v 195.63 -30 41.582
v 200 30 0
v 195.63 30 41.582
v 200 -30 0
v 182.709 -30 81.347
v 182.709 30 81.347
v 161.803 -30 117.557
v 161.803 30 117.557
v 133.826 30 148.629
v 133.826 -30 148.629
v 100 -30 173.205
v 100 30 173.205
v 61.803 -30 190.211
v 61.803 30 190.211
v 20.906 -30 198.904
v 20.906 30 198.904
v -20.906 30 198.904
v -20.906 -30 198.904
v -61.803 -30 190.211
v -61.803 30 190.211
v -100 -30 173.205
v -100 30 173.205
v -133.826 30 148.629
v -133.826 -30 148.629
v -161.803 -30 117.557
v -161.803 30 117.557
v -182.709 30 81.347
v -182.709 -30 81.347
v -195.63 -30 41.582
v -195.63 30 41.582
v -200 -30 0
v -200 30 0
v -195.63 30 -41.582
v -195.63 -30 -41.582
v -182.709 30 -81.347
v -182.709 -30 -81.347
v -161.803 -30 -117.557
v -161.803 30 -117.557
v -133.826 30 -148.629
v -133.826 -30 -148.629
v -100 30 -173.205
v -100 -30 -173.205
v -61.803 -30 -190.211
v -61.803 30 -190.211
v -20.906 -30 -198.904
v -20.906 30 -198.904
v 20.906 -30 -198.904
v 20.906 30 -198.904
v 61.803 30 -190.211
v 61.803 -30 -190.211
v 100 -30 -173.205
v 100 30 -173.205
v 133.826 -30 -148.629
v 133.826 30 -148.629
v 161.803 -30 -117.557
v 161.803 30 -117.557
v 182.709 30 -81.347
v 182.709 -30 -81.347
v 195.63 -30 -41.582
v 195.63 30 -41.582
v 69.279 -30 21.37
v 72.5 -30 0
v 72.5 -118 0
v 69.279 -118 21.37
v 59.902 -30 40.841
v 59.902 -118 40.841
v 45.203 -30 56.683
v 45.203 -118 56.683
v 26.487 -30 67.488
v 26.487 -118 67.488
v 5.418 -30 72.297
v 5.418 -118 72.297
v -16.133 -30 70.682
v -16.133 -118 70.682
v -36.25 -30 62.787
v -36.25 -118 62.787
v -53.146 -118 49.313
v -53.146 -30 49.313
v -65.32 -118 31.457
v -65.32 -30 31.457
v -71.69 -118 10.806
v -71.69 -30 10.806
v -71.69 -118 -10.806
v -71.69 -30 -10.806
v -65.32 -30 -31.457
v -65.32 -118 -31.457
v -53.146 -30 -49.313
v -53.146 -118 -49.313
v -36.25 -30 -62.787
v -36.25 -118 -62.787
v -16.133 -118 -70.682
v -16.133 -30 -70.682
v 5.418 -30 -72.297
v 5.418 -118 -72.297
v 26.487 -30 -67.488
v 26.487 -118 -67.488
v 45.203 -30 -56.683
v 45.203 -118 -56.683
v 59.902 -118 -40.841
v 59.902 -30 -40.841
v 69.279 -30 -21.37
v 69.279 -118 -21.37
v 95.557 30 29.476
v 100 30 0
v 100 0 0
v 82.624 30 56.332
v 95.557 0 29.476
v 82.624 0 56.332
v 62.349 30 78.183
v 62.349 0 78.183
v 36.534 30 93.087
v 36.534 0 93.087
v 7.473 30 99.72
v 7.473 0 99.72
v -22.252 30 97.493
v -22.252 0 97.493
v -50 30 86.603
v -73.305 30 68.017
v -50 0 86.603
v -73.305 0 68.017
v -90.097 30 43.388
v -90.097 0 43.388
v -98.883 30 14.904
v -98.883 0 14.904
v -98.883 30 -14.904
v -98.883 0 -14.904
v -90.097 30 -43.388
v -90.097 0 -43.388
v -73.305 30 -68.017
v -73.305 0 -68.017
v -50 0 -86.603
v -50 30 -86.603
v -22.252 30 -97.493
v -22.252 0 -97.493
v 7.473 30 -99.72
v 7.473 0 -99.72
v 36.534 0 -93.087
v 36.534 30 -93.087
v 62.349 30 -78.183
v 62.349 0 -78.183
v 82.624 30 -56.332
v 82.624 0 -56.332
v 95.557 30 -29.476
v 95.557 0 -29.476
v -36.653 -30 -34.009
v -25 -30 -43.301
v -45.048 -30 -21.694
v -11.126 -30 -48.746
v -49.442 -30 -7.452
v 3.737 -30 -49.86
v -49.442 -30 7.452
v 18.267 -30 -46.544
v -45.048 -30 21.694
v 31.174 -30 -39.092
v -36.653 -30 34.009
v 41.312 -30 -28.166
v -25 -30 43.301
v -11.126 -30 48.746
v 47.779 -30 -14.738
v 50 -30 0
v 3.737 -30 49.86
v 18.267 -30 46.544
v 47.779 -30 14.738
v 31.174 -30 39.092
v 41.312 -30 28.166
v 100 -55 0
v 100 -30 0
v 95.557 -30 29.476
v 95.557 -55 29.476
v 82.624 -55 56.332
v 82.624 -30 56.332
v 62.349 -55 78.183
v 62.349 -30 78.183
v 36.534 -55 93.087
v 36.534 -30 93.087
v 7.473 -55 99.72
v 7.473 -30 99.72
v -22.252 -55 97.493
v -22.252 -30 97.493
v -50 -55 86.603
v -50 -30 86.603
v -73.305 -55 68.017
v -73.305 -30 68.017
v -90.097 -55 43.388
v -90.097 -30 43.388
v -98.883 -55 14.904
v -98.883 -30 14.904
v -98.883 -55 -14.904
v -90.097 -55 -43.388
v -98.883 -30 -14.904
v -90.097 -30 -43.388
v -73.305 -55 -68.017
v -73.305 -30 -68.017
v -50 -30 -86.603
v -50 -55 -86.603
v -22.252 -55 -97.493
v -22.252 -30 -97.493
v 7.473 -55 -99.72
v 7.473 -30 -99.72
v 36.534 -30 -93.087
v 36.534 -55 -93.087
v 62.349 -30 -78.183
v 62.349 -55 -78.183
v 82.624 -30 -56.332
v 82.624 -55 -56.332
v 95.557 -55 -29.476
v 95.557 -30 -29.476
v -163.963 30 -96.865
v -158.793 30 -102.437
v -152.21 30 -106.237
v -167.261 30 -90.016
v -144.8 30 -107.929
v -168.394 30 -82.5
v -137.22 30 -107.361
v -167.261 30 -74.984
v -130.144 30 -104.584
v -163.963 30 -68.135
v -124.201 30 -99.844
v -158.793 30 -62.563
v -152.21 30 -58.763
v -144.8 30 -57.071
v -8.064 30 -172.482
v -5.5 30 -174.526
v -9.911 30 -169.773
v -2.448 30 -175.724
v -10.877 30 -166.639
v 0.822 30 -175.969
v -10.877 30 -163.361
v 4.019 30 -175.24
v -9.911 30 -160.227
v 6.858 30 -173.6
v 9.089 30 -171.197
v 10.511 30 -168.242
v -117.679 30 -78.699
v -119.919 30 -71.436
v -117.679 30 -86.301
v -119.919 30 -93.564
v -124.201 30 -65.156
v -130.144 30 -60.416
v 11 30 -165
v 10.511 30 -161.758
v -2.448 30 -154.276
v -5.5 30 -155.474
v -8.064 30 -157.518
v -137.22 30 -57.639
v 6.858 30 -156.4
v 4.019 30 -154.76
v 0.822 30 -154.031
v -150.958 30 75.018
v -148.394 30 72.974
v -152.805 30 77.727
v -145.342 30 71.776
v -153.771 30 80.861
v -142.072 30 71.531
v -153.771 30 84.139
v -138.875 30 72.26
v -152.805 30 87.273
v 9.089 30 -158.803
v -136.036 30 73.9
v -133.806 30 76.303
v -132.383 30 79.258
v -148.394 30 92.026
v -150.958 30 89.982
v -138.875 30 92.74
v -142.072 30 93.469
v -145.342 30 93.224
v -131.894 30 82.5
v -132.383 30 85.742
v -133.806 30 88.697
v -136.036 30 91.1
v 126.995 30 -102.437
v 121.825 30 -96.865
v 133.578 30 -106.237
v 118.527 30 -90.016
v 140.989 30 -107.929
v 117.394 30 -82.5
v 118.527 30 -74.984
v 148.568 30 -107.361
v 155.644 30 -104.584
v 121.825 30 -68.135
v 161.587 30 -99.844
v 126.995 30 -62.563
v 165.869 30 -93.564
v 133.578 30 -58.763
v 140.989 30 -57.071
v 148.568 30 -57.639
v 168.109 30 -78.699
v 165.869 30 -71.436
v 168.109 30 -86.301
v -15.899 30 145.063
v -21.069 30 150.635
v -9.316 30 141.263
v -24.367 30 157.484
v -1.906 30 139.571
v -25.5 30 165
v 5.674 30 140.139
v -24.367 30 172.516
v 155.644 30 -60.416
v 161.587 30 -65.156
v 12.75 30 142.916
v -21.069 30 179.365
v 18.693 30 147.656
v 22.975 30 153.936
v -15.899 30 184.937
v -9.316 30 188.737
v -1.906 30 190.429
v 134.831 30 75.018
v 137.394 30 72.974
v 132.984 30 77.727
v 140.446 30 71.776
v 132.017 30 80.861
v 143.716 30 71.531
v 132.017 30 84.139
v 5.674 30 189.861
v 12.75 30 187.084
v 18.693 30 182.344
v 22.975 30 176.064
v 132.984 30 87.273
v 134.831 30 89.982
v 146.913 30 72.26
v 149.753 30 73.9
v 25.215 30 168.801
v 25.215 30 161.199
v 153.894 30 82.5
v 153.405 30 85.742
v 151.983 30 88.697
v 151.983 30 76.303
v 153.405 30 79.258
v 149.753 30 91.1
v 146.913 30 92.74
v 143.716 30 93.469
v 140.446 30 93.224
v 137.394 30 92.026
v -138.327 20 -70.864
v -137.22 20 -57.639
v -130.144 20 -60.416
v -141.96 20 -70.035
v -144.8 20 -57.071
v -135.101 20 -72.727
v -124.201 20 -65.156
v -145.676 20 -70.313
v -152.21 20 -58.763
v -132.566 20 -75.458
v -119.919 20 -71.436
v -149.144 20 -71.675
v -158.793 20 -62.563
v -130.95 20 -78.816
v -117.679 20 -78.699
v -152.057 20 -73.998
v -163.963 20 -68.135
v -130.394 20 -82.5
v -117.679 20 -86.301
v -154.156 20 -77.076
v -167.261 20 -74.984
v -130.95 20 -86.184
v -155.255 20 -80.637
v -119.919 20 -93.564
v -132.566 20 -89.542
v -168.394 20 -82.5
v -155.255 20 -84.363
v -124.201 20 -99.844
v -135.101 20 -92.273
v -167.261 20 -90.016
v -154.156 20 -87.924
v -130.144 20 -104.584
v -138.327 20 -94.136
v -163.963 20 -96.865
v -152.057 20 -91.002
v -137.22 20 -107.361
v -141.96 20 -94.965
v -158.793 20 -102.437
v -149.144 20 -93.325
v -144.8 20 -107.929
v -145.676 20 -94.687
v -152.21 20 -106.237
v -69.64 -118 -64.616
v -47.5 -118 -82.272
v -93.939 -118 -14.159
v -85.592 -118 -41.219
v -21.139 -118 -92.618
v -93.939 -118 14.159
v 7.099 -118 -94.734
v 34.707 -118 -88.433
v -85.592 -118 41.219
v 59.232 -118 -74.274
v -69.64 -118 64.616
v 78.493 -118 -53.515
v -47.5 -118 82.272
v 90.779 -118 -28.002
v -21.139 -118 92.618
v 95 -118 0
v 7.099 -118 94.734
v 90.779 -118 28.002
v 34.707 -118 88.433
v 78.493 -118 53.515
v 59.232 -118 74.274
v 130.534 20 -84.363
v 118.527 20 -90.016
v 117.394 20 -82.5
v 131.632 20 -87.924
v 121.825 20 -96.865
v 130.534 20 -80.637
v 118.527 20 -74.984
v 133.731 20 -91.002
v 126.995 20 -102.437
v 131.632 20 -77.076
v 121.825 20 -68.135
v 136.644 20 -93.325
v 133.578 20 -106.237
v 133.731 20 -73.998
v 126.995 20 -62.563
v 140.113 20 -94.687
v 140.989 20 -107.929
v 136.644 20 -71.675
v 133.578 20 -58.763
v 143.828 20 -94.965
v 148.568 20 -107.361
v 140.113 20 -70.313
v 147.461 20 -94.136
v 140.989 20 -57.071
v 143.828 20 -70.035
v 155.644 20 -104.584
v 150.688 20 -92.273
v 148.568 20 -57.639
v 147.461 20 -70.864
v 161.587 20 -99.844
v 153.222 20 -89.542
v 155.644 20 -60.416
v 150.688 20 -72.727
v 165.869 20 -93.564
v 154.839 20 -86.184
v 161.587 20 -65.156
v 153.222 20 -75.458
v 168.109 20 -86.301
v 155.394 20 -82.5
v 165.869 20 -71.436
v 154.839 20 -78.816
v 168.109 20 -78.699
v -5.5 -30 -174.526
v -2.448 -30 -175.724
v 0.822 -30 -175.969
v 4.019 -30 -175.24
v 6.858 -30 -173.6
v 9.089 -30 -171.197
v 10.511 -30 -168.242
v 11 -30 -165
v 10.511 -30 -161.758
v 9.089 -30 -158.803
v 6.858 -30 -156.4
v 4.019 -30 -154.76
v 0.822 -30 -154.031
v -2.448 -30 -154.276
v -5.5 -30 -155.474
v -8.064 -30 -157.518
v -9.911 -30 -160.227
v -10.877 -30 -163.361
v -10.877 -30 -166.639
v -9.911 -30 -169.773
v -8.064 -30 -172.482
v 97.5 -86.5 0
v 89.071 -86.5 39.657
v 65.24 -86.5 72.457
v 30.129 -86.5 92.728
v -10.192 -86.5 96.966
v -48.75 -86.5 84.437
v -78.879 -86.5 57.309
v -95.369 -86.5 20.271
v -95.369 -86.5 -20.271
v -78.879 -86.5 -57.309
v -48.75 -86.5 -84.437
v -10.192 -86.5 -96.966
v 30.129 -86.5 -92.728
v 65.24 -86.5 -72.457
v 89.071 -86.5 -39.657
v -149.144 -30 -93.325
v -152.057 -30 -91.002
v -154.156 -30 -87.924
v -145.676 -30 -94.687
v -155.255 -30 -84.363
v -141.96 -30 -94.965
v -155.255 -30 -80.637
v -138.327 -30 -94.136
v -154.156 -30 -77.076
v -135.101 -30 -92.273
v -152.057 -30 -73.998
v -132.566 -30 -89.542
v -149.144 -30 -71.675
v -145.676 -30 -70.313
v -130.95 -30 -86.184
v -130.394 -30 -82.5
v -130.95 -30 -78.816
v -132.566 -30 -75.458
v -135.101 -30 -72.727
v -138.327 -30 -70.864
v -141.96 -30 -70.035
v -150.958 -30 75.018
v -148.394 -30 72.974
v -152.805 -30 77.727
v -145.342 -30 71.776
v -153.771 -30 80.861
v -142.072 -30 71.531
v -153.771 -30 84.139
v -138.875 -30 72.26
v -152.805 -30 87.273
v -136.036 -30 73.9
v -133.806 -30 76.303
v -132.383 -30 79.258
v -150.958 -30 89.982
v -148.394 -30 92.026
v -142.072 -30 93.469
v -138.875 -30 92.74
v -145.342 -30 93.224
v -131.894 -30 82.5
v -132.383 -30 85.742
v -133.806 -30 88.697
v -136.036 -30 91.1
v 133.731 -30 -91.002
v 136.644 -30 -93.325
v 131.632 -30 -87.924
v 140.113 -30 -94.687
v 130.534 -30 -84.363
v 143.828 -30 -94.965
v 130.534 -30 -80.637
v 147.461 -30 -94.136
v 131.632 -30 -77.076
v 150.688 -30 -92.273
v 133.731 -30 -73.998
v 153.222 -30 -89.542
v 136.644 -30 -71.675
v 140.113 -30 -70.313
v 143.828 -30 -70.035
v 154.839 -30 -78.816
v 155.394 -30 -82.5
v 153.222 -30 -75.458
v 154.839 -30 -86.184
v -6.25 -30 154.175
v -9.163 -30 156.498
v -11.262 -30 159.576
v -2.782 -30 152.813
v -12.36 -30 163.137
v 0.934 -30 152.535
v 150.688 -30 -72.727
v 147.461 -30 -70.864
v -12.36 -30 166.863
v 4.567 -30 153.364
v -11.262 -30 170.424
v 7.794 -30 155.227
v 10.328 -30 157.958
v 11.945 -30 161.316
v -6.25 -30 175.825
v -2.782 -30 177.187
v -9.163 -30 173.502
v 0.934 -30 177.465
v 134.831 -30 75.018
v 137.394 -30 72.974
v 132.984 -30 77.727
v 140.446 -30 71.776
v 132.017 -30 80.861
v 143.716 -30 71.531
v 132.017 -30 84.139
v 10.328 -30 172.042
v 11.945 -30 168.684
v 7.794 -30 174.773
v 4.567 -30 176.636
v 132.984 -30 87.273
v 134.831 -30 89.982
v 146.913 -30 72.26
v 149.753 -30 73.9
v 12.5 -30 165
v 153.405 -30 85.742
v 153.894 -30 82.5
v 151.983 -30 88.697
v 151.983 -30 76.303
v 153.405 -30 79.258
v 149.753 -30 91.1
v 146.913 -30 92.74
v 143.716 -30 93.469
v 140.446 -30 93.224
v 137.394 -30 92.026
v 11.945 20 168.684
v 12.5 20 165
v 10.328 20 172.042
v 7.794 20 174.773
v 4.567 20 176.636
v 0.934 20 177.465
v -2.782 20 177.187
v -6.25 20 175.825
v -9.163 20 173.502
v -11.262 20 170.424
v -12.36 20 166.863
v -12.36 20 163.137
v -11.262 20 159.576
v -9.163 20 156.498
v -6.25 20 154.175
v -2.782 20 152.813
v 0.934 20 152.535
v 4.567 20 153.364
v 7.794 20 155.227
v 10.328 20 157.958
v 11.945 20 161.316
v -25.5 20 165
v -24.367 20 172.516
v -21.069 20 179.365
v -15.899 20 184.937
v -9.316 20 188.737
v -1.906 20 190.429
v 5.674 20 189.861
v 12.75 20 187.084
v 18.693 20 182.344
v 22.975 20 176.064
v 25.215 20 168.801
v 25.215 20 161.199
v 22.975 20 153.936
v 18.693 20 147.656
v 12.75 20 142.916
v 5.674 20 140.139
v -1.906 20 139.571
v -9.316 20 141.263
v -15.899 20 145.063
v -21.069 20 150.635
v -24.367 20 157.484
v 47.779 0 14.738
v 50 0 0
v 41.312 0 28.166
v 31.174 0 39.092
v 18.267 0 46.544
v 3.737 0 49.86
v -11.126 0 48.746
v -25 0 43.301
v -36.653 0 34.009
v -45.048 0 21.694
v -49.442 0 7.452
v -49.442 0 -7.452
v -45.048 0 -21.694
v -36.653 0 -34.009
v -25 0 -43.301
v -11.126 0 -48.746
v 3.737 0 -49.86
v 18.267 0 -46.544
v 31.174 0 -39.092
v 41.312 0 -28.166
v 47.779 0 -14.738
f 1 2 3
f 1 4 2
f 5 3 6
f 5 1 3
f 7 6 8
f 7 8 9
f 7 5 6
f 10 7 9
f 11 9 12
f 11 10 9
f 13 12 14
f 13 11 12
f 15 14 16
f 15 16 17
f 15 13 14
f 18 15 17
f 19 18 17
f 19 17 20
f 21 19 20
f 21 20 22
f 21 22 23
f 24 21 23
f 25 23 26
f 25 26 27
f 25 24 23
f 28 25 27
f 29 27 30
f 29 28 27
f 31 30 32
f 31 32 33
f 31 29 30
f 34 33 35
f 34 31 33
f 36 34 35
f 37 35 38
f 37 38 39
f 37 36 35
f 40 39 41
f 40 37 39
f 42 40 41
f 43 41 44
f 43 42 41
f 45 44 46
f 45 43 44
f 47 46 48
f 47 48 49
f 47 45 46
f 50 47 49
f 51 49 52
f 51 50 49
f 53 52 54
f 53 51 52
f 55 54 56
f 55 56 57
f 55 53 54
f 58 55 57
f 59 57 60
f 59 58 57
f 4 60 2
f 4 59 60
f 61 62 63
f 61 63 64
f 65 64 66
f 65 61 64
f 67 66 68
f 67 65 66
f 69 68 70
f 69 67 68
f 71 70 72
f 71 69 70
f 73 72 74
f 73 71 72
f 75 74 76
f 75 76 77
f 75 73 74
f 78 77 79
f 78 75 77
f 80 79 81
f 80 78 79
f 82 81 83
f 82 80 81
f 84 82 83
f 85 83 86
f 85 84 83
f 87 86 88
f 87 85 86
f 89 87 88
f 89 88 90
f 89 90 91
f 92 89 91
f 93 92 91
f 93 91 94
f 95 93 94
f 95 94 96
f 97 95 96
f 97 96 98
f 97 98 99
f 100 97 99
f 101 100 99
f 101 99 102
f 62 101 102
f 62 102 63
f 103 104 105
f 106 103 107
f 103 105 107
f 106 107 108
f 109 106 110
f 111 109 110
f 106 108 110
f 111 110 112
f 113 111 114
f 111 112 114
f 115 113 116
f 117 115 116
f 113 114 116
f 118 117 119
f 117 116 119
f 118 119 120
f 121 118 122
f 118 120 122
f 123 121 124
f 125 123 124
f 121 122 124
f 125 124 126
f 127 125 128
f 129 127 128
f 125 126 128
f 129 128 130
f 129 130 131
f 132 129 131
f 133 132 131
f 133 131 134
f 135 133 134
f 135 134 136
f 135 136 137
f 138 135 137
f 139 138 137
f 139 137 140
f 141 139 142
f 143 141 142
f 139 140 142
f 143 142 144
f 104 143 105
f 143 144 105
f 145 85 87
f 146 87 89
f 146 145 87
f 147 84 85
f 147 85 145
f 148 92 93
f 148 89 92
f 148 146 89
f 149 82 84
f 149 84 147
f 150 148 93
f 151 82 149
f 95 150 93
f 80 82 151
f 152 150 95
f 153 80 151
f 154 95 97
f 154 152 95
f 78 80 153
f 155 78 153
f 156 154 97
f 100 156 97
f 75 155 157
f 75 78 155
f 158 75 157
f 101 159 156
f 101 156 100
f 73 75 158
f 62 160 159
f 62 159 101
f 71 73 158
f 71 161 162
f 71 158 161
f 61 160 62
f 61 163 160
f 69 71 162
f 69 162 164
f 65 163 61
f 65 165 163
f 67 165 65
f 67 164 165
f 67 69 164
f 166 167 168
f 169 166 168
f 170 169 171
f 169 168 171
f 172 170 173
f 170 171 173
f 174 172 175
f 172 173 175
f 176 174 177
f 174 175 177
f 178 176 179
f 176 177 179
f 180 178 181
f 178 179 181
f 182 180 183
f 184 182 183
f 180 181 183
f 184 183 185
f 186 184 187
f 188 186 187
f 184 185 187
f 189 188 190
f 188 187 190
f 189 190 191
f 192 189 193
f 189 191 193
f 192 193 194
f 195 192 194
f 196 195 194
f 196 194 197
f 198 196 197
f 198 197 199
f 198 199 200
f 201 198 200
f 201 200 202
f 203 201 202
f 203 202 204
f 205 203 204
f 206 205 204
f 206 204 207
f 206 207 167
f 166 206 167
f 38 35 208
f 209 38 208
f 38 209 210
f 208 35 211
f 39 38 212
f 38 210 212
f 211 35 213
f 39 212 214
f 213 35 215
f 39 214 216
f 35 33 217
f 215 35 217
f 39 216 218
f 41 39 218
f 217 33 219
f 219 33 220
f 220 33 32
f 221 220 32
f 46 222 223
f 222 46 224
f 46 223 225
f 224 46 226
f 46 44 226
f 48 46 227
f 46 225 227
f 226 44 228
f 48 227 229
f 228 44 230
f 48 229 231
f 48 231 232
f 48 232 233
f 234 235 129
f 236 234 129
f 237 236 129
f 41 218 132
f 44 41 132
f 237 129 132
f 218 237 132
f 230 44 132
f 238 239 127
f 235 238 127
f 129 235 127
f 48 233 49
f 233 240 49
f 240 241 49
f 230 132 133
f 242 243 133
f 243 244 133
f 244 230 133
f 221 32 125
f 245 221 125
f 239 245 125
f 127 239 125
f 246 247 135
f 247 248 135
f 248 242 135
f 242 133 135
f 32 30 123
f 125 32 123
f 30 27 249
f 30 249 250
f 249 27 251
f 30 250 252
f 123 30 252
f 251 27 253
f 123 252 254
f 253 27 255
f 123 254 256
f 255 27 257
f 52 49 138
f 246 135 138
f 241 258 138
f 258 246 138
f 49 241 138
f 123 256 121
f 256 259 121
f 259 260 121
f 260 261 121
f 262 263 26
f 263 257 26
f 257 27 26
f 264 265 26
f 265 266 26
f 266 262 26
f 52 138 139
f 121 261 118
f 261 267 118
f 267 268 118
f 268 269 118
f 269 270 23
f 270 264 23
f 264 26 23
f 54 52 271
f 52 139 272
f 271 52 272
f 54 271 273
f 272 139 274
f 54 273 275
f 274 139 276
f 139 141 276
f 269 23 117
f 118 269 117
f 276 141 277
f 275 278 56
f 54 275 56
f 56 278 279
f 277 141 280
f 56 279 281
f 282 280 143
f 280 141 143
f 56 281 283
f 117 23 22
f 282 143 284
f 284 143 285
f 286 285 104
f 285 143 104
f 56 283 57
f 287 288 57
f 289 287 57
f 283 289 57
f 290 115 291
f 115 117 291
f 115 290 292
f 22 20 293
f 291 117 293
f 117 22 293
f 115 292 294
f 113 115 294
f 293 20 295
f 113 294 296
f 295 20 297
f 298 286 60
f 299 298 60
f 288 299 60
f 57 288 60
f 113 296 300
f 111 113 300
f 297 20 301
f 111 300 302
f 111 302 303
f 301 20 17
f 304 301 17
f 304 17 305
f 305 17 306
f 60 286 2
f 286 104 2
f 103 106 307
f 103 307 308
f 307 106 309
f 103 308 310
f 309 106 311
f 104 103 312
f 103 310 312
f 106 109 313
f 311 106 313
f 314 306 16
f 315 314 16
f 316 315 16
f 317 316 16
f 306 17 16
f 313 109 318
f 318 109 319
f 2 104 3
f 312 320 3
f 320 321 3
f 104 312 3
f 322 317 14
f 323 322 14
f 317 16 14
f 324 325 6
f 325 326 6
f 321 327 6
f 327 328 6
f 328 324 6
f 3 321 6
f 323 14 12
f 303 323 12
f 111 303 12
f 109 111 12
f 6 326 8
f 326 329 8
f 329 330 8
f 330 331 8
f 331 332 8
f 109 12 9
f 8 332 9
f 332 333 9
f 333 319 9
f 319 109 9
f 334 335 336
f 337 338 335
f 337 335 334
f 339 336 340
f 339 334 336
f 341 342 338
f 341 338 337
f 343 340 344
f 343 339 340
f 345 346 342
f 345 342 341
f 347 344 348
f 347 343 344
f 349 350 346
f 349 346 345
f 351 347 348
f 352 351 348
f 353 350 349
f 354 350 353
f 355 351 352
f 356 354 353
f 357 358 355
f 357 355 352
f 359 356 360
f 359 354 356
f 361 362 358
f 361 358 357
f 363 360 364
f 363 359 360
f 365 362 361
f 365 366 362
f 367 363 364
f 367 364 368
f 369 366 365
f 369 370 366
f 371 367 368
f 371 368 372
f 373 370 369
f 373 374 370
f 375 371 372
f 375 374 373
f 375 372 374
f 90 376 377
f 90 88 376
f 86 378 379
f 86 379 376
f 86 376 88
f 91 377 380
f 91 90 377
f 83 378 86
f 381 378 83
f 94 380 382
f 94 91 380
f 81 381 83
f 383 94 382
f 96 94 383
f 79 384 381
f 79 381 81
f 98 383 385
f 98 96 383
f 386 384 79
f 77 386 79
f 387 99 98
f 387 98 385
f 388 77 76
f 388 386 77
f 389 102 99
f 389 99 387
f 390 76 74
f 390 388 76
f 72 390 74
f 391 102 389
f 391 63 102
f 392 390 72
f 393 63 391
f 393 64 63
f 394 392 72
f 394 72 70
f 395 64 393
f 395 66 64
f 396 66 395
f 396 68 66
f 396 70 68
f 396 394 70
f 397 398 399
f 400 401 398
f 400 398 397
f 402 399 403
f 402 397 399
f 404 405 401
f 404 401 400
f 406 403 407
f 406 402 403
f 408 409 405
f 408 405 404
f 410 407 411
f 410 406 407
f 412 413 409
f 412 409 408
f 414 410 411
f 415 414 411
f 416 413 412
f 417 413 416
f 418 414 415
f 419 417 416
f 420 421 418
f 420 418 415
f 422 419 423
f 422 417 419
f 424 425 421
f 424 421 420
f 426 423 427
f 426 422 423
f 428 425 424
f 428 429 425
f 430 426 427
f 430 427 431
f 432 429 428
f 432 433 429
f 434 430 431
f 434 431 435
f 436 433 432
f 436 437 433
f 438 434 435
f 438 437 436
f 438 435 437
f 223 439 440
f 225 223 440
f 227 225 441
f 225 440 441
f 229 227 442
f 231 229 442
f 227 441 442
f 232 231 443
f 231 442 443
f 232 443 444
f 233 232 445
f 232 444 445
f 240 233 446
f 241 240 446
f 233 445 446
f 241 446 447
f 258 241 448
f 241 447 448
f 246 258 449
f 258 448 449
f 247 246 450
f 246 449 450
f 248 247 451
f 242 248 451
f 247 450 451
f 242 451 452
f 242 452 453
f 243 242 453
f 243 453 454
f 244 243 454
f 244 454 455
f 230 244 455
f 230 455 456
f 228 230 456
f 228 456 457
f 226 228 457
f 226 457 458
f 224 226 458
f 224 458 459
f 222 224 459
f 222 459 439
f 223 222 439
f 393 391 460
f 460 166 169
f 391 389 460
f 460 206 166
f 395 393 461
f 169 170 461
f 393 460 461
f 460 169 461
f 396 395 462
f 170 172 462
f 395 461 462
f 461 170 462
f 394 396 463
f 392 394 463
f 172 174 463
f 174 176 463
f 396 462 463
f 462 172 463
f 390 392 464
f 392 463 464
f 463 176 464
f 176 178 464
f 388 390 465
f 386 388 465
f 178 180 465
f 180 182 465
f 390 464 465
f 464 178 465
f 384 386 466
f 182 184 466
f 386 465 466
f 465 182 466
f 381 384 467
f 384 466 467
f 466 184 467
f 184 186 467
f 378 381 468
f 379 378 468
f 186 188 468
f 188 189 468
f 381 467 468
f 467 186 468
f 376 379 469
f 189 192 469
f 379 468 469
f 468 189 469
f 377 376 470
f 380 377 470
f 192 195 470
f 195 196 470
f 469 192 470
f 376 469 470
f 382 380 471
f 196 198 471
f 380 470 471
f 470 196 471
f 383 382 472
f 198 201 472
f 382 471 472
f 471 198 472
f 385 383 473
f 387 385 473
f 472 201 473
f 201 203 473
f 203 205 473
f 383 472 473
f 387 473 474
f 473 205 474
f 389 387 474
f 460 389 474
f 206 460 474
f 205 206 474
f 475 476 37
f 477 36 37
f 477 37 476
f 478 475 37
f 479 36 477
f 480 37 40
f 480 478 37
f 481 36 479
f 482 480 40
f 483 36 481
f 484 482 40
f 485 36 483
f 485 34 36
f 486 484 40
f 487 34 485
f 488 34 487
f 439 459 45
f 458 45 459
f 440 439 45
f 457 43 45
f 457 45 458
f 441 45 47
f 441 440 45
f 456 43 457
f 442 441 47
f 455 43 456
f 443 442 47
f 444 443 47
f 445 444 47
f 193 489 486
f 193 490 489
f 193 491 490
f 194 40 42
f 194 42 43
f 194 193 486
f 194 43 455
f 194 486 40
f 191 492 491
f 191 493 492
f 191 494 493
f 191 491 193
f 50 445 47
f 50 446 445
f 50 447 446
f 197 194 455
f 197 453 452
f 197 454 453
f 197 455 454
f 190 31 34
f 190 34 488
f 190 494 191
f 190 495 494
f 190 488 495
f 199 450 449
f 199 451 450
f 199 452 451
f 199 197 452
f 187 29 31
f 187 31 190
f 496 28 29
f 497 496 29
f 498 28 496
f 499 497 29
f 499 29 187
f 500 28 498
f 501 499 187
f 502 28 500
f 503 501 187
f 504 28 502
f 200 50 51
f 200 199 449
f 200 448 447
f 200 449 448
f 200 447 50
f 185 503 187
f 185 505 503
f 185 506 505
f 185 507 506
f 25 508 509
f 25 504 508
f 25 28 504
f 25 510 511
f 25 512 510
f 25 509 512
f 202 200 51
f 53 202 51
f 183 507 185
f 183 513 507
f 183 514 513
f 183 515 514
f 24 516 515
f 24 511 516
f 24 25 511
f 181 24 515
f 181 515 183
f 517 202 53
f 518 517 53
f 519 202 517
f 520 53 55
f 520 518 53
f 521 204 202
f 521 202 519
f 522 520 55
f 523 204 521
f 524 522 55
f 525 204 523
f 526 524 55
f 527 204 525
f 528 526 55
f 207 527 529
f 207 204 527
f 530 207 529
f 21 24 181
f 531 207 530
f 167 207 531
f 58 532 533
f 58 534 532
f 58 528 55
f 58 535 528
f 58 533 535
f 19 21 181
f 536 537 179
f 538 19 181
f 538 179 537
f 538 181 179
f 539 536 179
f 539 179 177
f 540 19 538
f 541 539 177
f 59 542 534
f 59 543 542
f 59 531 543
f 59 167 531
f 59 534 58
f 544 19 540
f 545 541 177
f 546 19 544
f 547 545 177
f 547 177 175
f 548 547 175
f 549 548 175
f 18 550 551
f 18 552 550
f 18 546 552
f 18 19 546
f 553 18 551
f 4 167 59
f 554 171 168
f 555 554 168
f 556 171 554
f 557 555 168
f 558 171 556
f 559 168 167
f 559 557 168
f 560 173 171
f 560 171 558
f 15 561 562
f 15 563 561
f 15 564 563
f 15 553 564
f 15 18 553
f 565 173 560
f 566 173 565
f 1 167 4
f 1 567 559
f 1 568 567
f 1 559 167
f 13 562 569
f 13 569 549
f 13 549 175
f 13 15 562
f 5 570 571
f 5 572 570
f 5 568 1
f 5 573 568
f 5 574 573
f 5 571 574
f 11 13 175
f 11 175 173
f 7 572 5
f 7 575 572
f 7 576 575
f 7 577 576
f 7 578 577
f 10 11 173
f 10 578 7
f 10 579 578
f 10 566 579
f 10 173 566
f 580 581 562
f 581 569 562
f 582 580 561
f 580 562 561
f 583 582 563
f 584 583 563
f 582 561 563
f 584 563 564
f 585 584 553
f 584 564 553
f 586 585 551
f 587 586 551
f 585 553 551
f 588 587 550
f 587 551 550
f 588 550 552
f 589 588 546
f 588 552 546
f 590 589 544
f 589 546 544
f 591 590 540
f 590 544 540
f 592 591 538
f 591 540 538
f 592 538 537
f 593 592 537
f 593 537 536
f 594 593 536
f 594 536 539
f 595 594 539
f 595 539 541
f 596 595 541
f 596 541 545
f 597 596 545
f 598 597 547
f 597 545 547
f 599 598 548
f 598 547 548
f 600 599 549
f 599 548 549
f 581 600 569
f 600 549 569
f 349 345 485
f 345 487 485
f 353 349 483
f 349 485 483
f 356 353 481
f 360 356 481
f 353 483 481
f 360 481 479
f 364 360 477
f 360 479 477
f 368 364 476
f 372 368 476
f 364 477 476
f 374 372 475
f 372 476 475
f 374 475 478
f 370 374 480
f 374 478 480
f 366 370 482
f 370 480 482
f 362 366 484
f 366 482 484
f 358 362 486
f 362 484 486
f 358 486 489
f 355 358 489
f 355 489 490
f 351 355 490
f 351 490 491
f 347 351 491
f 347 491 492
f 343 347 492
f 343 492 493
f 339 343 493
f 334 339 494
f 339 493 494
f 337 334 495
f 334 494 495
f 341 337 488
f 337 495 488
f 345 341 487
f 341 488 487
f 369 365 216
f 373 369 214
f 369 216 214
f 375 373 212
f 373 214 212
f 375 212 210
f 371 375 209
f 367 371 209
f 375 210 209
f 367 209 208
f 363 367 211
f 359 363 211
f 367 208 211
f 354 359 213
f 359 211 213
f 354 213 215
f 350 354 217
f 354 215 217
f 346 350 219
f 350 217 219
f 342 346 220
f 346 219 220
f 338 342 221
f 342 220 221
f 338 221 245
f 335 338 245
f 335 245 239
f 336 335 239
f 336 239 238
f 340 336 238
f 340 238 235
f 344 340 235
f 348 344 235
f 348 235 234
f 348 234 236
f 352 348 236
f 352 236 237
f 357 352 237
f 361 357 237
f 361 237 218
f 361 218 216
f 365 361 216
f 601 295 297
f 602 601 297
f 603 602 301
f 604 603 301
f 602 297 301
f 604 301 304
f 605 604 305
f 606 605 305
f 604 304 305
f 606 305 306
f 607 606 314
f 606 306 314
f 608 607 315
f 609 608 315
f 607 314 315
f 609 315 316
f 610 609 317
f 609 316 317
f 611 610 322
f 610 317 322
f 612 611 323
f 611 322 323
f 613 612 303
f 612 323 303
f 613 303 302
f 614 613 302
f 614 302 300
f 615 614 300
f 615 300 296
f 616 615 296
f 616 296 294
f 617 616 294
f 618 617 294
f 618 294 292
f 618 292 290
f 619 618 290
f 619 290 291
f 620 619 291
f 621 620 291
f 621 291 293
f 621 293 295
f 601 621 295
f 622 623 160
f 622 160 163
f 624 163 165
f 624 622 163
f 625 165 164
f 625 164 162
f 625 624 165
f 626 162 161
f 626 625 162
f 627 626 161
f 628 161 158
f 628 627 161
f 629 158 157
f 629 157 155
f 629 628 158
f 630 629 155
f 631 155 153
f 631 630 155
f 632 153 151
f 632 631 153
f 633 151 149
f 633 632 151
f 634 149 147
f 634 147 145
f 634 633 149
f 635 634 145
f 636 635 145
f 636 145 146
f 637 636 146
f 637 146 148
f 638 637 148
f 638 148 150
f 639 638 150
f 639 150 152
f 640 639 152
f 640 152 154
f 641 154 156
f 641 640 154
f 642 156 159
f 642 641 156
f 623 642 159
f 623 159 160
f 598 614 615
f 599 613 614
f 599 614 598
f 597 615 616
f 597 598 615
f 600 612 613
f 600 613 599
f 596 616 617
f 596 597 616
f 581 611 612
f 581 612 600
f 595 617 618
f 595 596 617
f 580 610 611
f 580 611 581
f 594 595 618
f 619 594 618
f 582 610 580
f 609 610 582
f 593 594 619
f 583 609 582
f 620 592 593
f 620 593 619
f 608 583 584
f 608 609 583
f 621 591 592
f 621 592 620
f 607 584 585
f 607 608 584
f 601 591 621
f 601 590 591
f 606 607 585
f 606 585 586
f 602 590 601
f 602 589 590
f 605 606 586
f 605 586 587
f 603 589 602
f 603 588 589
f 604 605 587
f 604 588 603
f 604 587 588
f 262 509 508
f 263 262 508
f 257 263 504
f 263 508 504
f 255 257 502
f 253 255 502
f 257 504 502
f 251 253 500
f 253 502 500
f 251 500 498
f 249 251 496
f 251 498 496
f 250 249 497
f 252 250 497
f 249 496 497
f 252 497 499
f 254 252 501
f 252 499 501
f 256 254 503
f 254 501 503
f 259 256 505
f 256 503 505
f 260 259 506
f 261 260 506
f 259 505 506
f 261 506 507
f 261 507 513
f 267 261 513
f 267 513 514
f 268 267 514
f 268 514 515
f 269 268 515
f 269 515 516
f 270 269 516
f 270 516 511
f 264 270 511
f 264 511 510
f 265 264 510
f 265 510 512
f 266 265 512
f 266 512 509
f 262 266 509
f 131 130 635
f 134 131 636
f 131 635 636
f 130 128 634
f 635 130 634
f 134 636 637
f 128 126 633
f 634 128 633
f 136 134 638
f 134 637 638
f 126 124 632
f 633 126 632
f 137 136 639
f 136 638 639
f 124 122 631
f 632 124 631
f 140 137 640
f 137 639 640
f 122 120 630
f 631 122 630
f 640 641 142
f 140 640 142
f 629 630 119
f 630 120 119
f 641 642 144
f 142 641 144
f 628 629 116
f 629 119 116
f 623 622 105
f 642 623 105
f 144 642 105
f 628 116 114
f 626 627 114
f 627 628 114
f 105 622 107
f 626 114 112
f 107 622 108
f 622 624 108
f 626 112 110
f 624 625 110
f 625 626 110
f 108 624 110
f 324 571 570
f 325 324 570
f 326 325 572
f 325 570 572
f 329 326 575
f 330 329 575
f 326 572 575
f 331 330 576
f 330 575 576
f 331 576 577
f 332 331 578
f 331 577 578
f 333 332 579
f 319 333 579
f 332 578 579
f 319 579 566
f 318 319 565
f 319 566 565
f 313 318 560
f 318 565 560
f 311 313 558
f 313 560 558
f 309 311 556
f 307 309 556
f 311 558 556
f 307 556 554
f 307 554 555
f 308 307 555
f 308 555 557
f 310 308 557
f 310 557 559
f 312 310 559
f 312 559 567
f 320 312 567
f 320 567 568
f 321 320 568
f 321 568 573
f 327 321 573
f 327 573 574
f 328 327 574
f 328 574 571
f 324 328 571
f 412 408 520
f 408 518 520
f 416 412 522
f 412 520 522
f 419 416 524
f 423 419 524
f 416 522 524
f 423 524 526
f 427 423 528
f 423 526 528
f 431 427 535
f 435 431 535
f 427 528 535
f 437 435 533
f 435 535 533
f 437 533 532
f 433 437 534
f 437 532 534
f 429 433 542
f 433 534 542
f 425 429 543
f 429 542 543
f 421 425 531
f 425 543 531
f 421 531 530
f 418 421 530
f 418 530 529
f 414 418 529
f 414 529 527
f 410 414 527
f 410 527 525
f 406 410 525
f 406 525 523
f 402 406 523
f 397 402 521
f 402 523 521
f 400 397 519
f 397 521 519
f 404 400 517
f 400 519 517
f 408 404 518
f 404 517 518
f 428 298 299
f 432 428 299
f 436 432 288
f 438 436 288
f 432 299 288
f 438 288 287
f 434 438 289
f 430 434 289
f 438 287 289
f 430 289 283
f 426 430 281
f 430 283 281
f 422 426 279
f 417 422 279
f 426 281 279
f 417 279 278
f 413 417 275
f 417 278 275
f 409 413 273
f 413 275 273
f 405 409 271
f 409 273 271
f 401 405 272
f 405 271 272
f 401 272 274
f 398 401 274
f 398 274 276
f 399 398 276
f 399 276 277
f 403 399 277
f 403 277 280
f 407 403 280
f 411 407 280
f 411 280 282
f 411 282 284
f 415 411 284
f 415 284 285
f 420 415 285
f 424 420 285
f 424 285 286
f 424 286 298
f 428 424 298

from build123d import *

# Parameters (mm, degrees)
F0_R            = 200
F0_R_2          = 100
F0_R_3          = 72.5
F0_R_4          = 50
F1_DEPTH        = 30
F2_DEPTH        = 118
F3_DEPTH        = 30
F5_D            = 25
F5_CBORE_D      = 51
F5_CBORE_DEPTH  = 10
F5_COPIES_COUNT = 3
F6_D            = 22
F6_COPIES_COUNT = 3
F7_SIZE2        = 63
F7_SIZE         = 5


# Not quite as in the source:
# - a pattern or mirror of a feature is missing from the dataset's text; its kind, count and spacing are read off the source's solid


with BuildPart() as f1:
    # F0 (on Front) → F1 (new body)
    with BuildSketch(Plane.XZ):
        Circle(F0_R)
        Circle(F0_R_2, mode=Mode.SUBTRACT)
        Circle(F0_R_2)
        Circle(F0_R_3, mode=Mode.SUBTRACT)
        Circle(F0_R_3)
        Circle(F0_R_4, mode=Mode.SUBTRACT)
    extrude(amount=F1_DEPTH)

    # F0 (on Front) → F2 (join)
    with BuildSketch(Plane.XZ):
        Circle(F0_R_2)
        Circle(F0_R_3, mode=Mode.SUBTRACT)
    extrude(amount=F2_DEPTH)

    # F0 (on Front) → F3 (join)
    with BuildSketch(Plane.XZ):
        Circle(F0_R)
        Circle(F0_R_2, mode=Mode.SUBTRACT)
    extrude(amount=-F3_DEPTH)

    # F5 (through all)
    with Locations(Plane(origin=(0, 30, 0), x_dir=(-1, 0, 0), z_dir=(0, 1, 0))):
        with Locations((0, 165)):
            f5 = CounterBoreHole(F5_D / 2, F5_CBORE_D / 2, F5_CBORE_DEPTH)

    # F5_copies: F5 ×3 about axis
    f5_copies_axis = Axis((0, 0, 0), (0, 1, 0))
    for i in range(1, F5_COPIES_COUNT):
        add(f5.rotate(f5_copies_axis, i * 360 / F5_COPIES_COUNT), mode=Mode.SUBTRACT)

    # F6 (through all)
    with Locations(Plane(origin=(0, 30, 0), x_dir=(-1, 0, 0), z_dir=(0, 1, 0))):
        with Locations((-142.8941916244, 82.5)):
            f6 = Hole(F6_D / 2)

    # F6_copies: F6 ×3 about axis
    f6_copies_axis = Axis((0, 0, 0), (0, 1, 0))
    for i in range(1, F6_COPIES_COUNT):
        add(f6.rotate(f6_copies_axis, i * 360 / F6_COPIES_COUNT), mode=Mode.SUBTRACT)

    # F7
    f7_edges = [f1.edges().sort_by_distance(p)[0] for p in [
        (-100, -118, 0),
    ]]
    f7_side = f1.faces().sort_by_distance((-97.171573, -118, 0))[0]
    chamfer(f7_edges, length=F7_SIZE, length2=F7_SIZE2, reference=f7_side)


solid = f1.part
